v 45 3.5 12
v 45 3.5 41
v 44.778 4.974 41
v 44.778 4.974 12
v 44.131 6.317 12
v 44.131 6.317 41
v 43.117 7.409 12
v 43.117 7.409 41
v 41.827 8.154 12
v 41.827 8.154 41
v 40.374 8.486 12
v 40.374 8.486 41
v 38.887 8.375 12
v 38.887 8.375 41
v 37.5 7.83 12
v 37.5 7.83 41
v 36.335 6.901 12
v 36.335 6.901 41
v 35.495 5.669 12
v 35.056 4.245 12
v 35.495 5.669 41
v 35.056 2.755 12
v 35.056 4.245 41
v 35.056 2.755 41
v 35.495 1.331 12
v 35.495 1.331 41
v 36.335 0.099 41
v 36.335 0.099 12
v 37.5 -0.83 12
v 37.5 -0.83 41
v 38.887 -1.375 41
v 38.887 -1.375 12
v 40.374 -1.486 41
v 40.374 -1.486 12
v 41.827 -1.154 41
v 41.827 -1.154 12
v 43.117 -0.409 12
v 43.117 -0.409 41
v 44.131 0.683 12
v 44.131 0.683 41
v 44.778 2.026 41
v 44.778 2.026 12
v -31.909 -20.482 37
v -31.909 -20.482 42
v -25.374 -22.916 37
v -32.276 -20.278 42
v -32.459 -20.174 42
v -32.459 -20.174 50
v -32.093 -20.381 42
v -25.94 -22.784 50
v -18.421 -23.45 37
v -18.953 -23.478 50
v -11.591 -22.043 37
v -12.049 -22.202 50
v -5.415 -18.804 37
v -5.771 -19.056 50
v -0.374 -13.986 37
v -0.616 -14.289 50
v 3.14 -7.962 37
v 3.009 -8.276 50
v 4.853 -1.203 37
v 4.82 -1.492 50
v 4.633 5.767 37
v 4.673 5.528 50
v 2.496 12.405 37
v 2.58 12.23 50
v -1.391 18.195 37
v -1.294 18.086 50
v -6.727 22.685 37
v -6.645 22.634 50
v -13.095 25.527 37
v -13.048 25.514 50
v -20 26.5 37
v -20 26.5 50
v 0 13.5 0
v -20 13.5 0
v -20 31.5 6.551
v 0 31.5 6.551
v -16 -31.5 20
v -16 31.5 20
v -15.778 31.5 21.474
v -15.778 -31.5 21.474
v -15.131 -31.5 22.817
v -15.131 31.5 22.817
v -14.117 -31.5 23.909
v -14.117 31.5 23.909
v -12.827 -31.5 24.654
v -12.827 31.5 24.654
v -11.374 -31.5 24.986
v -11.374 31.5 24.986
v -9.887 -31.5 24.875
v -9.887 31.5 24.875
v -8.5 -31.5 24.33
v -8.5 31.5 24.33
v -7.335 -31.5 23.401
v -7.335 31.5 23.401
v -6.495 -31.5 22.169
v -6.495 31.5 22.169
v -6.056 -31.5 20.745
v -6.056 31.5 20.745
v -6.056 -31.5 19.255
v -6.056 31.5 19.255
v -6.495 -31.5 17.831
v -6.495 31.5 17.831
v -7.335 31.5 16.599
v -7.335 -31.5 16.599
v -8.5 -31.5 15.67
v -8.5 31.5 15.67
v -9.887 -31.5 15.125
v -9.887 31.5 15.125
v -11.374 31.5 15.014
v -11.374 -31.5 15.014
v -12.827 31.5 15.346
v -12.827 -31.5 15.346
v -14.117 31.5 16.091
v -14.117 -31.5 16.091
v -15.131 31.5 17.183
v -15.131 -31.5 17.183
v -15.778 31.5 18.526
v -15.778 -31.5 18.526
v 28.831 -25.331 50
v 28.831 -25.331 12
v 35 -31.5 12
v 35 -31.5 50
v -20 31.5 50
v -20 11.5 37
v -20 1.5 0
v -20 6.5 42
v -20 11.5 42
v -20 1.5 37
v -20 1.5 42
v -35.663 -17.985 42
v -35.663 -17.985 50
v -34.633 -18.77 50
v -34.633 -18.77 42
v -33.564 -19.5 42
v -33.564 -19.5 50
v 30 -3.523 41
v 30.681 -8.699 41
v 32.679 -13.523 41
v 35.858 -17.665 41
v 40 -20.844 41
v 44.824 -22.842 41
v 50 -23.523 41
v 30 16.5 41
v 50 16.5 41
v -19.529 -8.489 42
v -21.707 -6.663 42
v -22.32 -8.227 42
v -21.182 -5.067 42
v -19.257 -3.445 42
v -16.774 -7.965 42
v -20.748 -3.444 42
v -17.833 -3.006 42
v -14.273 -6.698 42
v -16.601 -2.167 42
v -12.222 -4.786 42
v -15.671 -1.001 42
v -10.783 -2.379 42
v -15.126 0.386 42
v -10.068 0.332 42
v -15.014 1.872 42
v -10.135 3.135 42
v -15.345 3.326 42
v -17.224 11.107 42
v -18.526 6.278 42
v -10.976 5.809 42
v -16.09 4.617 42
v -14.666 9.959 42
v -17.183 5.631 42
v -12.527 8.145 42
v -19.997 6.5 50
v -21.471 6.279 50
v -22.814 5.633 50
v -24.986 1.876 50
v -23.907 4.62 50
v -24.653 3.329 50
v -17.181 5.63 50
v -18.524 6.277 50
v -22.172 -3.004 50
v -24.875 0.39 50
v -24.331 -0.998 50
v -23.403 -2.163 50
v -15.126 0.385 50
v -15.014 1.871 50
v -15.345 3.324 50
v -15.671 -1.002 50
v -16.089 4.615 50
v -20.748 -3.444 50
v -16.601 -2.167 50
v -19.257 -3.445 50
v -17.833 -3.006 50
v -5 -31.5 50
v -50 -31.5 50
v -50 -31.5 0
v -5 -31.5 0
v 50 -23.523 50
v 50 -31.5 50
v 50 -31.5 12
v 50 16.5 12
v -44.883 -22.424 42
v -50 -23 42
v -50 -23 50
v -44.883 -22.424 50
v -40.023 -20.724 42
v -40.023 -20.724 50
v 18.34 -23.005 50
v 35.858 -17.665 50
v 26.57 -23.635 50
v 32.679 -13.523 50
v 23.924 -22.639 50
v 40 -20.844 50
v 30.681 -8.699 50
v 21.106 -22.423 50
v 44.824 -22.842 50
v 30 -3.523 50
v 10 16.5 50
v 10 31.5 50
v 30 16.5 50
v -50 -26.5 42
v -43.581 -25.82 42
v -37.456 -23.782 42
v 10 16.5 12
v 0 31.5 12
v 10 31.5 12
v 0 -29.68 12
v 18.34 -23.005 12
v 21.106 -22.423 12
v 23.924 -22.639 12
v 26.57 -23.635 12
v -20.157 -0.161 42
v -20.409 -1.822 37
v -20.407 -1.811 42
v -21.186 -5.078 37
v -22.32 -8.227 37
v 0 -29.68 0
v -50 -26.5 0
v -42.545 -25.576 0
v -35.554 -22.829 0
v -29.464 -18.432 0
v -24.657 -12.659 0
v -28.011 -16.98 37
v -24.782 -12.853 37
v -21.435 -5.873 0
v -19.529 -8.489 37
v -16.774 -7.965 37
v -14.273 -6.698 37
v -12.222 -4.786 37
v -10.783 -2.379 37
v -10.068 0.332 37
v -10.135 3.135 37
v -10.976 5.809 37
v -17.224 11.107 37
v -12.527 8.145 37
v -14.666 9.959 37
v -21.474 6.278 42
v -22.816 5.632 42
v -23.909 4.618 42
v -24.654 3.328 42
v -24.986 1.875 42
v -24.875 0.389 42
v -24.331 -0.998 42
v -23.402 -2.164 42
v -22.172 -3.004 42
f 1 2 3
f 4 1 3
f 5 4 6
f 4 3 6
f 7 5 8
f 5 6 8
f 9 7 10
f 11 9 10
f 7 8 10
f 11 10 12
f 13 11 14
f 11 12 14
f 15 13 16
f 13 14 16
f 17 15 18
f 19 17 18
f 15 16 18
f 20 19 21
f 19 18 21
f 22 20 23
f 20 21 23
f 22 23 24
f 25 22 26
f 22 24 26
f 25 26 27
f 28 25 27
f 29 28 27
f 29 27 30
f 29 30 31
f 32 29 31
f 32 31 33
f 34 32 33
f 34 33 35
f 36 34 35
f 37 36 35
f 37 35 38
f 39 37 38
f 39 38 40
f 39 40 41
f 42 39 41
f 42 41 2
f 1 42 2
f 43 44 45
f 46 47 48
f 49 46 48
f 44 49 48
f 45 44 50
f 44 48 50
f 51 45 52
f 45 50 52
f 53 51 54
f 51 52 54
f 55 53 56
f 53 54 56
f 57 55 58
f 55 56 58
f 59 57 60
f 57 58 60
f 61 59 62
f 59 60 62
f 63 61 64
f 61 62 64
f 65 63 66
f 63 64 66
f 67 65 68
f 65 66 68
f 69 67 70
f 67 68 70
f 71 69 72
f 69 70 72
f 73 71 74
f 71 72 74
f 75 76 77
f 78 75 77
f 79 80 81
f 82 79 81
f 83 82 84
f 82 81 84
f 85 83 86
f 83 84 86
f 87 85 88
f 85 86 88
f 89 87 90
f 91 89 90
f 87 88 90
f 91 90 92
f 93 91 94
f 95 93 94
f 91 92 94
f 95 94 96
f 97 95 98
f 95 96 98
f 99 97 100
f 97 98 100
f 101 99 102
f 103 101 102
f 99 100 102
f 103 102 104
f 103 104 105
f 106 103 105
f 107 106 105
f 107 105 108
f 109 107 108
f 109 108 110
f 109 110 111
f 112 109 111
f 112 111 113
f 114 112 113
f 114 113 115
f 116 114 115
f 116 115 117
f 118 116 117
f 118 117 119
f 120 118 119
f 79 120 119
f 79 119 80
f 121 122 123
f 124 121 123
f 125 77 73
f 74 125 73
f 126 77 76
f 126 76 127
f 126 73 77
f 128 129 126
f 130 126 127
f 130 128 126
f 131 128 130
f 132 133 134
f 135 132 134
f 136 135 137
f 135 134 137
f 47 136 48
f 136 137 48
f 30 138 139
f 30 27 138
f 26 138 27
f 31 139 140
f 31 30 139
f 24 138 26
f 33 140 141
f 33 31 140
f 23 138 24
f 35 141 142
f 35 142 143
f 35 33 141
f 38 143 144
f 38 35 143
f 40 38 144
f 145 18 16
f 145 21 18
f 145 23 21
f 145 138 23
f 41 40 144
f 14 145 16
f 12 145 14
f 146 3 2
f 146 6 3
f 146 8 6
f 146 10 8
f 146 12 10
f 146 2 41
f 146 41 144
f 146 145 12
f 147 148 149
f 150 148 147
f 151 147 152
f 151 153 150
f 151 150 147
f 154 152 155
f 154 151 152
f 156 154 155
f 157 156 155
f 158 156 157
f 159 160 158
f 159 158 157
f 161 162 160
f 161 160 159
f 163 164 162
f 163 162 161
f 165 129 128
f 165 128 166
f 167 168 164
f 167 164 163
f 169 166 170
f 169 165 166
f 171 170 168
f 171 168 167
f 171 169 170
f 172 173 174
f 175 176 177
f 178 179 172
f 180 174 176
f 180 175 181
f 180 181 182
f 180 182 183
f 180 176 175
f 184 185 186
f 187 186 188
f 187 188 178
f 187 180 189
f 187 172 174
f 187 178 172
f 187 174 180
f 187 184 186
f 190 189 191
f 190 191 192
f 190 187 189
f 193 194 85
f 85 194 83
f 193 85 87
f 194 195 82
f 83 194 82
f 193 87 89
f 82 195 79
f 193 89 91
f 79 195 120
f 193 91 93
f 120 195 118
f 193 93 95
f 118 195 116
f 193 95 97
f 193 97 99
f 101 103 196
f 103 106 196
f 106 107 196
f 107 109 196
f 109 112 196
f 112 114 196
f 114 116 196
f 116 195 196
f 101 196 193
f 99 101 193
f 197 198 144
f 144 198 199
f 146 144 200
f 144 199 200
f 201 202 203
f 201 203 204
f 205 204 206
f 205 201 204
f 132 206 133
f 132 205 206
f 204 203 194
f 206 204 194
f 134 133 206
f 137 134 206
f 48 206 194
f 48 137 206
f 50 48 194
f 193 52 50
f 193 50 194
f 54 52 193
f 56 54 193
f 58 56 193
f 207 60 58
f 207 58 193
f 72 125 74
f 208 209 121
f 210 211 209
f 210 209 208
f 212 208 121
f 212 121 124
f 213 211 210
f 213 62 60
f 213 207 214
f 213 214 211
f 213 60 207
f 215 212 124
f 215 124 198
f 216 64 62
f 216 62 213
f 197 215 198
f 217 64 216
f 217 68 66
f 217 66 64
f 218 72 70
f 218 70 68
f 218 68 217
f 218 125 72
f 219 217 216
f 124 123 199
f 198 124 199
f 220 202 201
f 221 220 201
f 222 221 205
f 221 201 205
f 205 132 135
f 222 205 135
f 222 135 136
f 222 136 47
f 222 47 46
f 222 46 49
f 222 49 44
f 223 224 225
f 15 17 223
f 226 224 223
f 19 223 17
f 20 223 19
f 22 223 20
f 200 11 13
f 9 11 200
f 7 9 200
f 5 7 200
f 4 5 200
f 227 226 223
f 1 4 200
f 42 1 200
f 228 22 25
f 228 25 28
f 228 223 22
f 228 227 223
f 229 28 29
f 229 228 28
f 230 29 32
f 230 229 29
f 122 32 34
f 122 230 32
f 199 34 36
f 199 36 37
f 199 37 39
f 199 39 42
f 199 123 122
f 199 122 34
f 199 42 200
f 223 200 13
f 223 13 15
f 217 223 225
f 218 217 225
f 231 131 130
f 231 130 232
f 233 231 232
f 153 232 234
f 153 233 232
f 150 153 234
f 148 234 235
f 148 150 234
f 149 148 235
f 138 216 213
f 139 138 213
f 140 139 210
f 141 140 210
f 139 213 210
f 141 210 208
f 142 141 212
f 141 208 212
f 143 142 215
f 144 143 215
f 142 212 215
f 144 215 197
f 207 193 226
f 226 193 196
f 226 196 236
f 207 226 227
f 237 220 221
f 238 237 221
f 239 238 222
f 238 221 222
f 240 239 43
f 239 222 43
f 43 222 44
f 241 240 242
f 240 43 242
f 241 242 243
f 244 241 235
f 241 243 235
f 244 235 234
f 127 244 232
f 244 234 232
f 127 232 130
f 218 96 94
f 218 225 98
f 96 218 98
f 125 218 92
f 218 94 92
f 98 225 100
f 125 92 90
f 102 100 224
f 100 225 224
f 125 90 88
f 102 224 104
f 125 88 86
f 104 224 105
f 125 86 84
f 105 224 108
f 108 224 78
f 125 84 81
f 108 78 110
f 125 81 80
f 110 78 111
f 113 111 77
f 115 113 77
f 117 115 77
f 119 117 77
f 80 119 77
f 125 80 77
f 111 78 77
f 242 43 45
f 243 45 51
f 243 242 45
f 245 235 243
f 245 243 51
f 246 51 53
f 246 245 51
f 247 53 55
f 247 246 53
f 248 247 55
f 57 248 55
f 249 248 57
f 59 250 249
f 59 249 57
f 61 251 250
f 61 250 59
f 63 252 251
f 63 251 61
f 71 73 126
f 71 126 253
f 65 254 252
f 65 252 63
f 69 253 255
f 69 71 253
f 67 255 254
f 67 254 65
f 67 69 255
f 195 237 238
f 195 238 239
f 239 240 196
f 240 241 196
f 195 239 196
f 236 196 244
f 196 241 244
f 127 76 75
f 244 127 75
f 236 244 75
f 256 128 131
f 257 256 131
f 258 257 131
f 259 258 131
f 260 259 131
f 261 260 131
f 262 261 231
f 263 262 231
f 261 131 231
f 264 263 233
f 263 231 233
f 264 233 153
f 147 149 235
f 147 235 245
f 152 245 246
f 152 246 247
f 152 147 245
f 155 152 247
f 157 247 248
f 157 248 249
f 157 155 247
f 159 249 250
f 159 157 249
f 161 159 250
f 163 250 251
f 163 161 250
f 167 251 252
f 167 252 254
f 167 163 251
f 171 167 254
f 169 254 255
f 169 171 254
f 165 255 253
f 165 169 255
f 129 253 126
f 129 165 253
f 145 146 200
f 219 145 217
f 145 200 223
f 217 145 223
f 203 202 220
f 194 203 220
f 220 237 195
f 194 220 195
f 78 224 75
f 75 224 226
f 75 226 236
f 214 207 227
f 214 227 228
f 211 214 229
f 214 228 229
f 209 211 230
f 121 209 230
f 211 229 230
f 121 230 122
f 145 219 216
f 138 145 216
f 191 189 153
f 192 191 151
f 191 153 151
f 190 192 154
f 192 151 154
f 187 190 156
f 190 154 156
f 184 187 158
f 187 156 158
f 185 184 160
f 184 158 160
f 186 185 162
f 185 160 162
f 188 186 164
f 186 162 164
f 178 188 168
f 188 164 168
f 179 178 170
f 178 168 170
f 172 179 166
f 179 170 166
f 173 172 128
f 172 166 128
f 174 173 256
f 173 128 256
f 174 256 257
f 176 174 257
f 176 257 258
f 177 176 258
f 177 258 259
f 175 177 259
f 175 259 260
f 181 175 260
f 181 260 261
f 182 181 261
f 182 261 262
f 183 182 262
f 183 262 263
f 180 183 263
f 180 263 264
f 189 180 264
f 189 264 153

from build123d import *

# Parameters (mm, degrees)
BOSS_EXTRUDE2_DEPTH      = 50
SKETCH2_R                = 5
CUT_EXTRUDE1_DEPTH       = 78.409624725
SKETCH2_5_R              = 5
CUT_EXTRUDE2_DEPTH       = 9
CUT_EXTRUDE12_DEPTH      = 78.409624725
CUT_EXTRUDE12_DEPTH_BACK = 42
CUT_EXTRUDE14_DEPTH      = 42
CUT_EXTRUDE16_DEPTH      = 78.409624725
CUT_EXTRUDE16_DEPTH_BACK = 78.409624725
SKETCH41_R               = 25
CUT_EXTRUDE17_DEPTH      = 13
BOSS_EXTRUDE8_START      = 5
BOSS_EXTRUDE8_DEPTH      = 5
SKETCH43_R               = 5
BOSS_EXTRUDE9_DEPTH      = 8
CUT_EXTRUDE19_DEPTH      = 92.609224426
CUT_EXTRUDE21_DEPTH      = 86.463442477
CUT_EXTRUDE21_DEPTH_BACK = 86.463442477
SKETCH45_W               = 50
SKETCH45_H               = 12
SKETCH46_R               = 5
CUT_EXTRUDE22_DEPTH      = 95.704804524


with BuildPart() as part:
    # Sketch1 → Boss-Extrude2 (new body)
    with BuildSketch(Plane.XY):
        with BuildLine():
            Line((10, 16.5), (10, 31.5))
            Line((10, 31.5), (-50, 31.5))
            Line((-50, 31.5), (-50, -31.5))
            Line((-50, -31.5), (-5, -31.5))
            Line((-5, -31.5), (18.339650933, -23.005061782))
            ThreePointArc((18.339650933, -23.005061782), (23.924248506, -22.639027919), (28.830920178, -25.330920178))
            Line((28.830920178, -25.330920178), (35, -31.5))
            Line((35, -31.5), (50, -31.5))
            Line((50, -31.5), (50, 16.5))
            Line((50, 16.5), (10, 16.5))
        make_face()
    extrude(amount=BOSS_EXTRUDE2_DEPTH)

    # Sketch2 → Cut-Extrude1 (cut, through all)
    with BuildSketch(Plane.XY.offset(50)):
        with Locations((40, 3.5)):
            Circle(SKETCH2_R)
    extrude(amount=-CUT_EXTRUDE1_DEPTH, mode=Mode.SUBTRACT)

    # Sketch2<5> → Cut-Extrude2 (cut)
    with BuildSketch(Plane.XY.offset(50)):
        with BuildLine():
            Line((50, 16.5), (30, 16.5))
            Line((30, 16.5), (30, -3.523038751))
            ThreePointArc((30, -3.523038751), (35.857864376, -17.665174375), (50, -23.523038751))
            Line((50, -23.523038751), (50, 16.5))
        make_face()
        with Locations((40, 3.5)):
            Circle(SKETCH2_5_R, mode=Mode.SUBTRACT)
    extrude(amount=-CUT_EXTRUDE2_DEPTH, mode=Mode.SUBTRACT)

    # Sketch30 → Cut-Extrude12 (cut, two sides: drawn at the far end of the back side and taken through both)
    with BuildSketch(Plane(origin=(0, 0, 0), x_dir=(-1, 0, 0), z_dir=(0, 0, -1)).offset(-CUT_EXTRUDE12_DEPTH_BACK)):
        with BuildLine():
            Line((291.204939457, -25.963430676), (50, -26.5))
            ThreePointArc((50, -26.5), (29.463716543, -18.431732275), (20, 1.5))
            Line((20, 1.5), (20, 31.5))
            Line((20, 31.5), (20, 272.705536266))
            Line((20, 272.705536266), (377.141103264, 597.005821897))
            Line((377.141103264, 597.005821897), (648.346042721, 298.336854955))
            Line((648.346042721, 298.336854955), (291.204939457, -25.963430676))
        make_face()
    extrude(amount=CUT_EXTRUDE12_DEPTH + CUT_EXTRUDE12_DEPTH_BACK, mode=Mode.SUBTRACT)

    # Sketch15 → Cut-Extrude14 (cut)
    with BuildSketch(Plane.XY.offset(50)):
        with BuildLine():
            Line((-20, 1.5), (-20, 26.5))
            ThreePointArc((-20, 26.5), (-44.154267569, 7.947585455), (-32.45893634, -20.174291344))
            ThreePointArc((-32.45893634, -20.174291344), (-23.864179013, -10.696774301), (-20, 1.5))
        make_face()
    extrude(amount=-CUT_EXTRUDE14_DEPTH, mode=Mode.SUBTRACT)

    # Sketch39 → Cut-Extrude16 (cut, two sides: drawn at the far end of the back side and taken through both)
    with BuildSketch(Plane.XY.offset(50).offset(-CUT_EXTRUDE16_DEPTH_BACK)):
        with BuildLine():
            Line((-50, 31.5), (-50, -23))
            ThreePointArc((-50, -23), (-42.405705612, -21.710059713), (-35.66325351, -17.984929805))
            ThreePointArc((-35.66325351, -17.984929805), (-43.580958898, 9.802913792), (-20, 26.5))
            Line((-20, 26.5), (-20, 31.5))
            Line((-20, 31.5), (-50, 31.5))
        make_face()
    extrude(amount=CUT_EXTRUDE16_DEPTH + CUT_EXTRUDE16_DEPTH_BACK, mode=Mode.SUBTRACT)

    # Sketch41 → Cut-Extrude17 (cut)
    with BuildSketch(Plane.XY.offset(50)):
        with Locations((-20, 1.5)):
            Circle(SKETCH41_R)
    extrude(amount=-CUT_EXTRUDE17_DEPTH, mode=Mode.SUBTRACT)

    # Sketch42 → Boss-Extrude8 (add)
    with BuildSketch(Plane.XY.offset(37).offset(BOSS_EXTRUDE8_START)):
        with BuildLine():
            Line((-20, 11.5), (-20, 1.5))
            ThreePointArc((-20, 1.5), (-20.751988631, -3.460904975), (-22.320276916, -8.227091808))
            ThreePointArc((-22.320276916, -8.227091808), (-10.068461396, 0.331864322), (-20, 11.5))
        make_face()
    extrude(amount=-BOSS_EXTRUDE8_DEPTH)

    # Sketch43 → Boss-Extrude9 (add)
    with BuildSketch(Plane.XY.offset(42)):
        with Locations(Location((-20, 1.5, 0), (0, 0, 261.397396505))):
            Circle(SKETCH43_R)
    extrude(amount=BOSS_EXTRUDE9_DEPTH)

    # Sketch44 → Cut-Extrude19 (cut, through all)
    with BuildSketch(Plane.ZY.offset(20)):
        Polygon((0, 13.5), (6.551464217, 31.5), (0, 31.5), align=None)
    extrude(amount=-CUT_EXTRUDE19_DEPTH, mode=Mode.SUBTRACT)

    # Sketch45 → Cut-Extrude21 (cut, two sides: drawn at the far end of the back side and taken through both)
    with BuildSketch(Plane(origin=(0, 16.5, 0), x_dir=(1, 0, 0), z_dir=(0, 1, 0)).offset(-CUT_EXTRUDE21_DEPTH_BACK)):
        with Locations((25, -6)):
            Rectangle(SKETCH45_W, SKETCH45_H)
    extrude(amount=CUT_EXTRUDE21_DEPTH + CUT_EXTRUDE21_DEPTH_BACK, mode=Mode.SUBTRACT)

    # Sketch46 → Cut-Extrude22 (cut, through all)
    with BuildSketch(Plane(origin=(0, 31.5, 0), x_dir=(1, 0, 0), z_dir=(0, 1, 0))):
        with Locations(Location((-11, -20, 0), (0, 0, 180))):
            Circle(SKETCH46_R)
    extrude(amount=-CUT_EXTRUDE22_DEPTH, mode=Mode.SUBTRACT)


solid = part.part
